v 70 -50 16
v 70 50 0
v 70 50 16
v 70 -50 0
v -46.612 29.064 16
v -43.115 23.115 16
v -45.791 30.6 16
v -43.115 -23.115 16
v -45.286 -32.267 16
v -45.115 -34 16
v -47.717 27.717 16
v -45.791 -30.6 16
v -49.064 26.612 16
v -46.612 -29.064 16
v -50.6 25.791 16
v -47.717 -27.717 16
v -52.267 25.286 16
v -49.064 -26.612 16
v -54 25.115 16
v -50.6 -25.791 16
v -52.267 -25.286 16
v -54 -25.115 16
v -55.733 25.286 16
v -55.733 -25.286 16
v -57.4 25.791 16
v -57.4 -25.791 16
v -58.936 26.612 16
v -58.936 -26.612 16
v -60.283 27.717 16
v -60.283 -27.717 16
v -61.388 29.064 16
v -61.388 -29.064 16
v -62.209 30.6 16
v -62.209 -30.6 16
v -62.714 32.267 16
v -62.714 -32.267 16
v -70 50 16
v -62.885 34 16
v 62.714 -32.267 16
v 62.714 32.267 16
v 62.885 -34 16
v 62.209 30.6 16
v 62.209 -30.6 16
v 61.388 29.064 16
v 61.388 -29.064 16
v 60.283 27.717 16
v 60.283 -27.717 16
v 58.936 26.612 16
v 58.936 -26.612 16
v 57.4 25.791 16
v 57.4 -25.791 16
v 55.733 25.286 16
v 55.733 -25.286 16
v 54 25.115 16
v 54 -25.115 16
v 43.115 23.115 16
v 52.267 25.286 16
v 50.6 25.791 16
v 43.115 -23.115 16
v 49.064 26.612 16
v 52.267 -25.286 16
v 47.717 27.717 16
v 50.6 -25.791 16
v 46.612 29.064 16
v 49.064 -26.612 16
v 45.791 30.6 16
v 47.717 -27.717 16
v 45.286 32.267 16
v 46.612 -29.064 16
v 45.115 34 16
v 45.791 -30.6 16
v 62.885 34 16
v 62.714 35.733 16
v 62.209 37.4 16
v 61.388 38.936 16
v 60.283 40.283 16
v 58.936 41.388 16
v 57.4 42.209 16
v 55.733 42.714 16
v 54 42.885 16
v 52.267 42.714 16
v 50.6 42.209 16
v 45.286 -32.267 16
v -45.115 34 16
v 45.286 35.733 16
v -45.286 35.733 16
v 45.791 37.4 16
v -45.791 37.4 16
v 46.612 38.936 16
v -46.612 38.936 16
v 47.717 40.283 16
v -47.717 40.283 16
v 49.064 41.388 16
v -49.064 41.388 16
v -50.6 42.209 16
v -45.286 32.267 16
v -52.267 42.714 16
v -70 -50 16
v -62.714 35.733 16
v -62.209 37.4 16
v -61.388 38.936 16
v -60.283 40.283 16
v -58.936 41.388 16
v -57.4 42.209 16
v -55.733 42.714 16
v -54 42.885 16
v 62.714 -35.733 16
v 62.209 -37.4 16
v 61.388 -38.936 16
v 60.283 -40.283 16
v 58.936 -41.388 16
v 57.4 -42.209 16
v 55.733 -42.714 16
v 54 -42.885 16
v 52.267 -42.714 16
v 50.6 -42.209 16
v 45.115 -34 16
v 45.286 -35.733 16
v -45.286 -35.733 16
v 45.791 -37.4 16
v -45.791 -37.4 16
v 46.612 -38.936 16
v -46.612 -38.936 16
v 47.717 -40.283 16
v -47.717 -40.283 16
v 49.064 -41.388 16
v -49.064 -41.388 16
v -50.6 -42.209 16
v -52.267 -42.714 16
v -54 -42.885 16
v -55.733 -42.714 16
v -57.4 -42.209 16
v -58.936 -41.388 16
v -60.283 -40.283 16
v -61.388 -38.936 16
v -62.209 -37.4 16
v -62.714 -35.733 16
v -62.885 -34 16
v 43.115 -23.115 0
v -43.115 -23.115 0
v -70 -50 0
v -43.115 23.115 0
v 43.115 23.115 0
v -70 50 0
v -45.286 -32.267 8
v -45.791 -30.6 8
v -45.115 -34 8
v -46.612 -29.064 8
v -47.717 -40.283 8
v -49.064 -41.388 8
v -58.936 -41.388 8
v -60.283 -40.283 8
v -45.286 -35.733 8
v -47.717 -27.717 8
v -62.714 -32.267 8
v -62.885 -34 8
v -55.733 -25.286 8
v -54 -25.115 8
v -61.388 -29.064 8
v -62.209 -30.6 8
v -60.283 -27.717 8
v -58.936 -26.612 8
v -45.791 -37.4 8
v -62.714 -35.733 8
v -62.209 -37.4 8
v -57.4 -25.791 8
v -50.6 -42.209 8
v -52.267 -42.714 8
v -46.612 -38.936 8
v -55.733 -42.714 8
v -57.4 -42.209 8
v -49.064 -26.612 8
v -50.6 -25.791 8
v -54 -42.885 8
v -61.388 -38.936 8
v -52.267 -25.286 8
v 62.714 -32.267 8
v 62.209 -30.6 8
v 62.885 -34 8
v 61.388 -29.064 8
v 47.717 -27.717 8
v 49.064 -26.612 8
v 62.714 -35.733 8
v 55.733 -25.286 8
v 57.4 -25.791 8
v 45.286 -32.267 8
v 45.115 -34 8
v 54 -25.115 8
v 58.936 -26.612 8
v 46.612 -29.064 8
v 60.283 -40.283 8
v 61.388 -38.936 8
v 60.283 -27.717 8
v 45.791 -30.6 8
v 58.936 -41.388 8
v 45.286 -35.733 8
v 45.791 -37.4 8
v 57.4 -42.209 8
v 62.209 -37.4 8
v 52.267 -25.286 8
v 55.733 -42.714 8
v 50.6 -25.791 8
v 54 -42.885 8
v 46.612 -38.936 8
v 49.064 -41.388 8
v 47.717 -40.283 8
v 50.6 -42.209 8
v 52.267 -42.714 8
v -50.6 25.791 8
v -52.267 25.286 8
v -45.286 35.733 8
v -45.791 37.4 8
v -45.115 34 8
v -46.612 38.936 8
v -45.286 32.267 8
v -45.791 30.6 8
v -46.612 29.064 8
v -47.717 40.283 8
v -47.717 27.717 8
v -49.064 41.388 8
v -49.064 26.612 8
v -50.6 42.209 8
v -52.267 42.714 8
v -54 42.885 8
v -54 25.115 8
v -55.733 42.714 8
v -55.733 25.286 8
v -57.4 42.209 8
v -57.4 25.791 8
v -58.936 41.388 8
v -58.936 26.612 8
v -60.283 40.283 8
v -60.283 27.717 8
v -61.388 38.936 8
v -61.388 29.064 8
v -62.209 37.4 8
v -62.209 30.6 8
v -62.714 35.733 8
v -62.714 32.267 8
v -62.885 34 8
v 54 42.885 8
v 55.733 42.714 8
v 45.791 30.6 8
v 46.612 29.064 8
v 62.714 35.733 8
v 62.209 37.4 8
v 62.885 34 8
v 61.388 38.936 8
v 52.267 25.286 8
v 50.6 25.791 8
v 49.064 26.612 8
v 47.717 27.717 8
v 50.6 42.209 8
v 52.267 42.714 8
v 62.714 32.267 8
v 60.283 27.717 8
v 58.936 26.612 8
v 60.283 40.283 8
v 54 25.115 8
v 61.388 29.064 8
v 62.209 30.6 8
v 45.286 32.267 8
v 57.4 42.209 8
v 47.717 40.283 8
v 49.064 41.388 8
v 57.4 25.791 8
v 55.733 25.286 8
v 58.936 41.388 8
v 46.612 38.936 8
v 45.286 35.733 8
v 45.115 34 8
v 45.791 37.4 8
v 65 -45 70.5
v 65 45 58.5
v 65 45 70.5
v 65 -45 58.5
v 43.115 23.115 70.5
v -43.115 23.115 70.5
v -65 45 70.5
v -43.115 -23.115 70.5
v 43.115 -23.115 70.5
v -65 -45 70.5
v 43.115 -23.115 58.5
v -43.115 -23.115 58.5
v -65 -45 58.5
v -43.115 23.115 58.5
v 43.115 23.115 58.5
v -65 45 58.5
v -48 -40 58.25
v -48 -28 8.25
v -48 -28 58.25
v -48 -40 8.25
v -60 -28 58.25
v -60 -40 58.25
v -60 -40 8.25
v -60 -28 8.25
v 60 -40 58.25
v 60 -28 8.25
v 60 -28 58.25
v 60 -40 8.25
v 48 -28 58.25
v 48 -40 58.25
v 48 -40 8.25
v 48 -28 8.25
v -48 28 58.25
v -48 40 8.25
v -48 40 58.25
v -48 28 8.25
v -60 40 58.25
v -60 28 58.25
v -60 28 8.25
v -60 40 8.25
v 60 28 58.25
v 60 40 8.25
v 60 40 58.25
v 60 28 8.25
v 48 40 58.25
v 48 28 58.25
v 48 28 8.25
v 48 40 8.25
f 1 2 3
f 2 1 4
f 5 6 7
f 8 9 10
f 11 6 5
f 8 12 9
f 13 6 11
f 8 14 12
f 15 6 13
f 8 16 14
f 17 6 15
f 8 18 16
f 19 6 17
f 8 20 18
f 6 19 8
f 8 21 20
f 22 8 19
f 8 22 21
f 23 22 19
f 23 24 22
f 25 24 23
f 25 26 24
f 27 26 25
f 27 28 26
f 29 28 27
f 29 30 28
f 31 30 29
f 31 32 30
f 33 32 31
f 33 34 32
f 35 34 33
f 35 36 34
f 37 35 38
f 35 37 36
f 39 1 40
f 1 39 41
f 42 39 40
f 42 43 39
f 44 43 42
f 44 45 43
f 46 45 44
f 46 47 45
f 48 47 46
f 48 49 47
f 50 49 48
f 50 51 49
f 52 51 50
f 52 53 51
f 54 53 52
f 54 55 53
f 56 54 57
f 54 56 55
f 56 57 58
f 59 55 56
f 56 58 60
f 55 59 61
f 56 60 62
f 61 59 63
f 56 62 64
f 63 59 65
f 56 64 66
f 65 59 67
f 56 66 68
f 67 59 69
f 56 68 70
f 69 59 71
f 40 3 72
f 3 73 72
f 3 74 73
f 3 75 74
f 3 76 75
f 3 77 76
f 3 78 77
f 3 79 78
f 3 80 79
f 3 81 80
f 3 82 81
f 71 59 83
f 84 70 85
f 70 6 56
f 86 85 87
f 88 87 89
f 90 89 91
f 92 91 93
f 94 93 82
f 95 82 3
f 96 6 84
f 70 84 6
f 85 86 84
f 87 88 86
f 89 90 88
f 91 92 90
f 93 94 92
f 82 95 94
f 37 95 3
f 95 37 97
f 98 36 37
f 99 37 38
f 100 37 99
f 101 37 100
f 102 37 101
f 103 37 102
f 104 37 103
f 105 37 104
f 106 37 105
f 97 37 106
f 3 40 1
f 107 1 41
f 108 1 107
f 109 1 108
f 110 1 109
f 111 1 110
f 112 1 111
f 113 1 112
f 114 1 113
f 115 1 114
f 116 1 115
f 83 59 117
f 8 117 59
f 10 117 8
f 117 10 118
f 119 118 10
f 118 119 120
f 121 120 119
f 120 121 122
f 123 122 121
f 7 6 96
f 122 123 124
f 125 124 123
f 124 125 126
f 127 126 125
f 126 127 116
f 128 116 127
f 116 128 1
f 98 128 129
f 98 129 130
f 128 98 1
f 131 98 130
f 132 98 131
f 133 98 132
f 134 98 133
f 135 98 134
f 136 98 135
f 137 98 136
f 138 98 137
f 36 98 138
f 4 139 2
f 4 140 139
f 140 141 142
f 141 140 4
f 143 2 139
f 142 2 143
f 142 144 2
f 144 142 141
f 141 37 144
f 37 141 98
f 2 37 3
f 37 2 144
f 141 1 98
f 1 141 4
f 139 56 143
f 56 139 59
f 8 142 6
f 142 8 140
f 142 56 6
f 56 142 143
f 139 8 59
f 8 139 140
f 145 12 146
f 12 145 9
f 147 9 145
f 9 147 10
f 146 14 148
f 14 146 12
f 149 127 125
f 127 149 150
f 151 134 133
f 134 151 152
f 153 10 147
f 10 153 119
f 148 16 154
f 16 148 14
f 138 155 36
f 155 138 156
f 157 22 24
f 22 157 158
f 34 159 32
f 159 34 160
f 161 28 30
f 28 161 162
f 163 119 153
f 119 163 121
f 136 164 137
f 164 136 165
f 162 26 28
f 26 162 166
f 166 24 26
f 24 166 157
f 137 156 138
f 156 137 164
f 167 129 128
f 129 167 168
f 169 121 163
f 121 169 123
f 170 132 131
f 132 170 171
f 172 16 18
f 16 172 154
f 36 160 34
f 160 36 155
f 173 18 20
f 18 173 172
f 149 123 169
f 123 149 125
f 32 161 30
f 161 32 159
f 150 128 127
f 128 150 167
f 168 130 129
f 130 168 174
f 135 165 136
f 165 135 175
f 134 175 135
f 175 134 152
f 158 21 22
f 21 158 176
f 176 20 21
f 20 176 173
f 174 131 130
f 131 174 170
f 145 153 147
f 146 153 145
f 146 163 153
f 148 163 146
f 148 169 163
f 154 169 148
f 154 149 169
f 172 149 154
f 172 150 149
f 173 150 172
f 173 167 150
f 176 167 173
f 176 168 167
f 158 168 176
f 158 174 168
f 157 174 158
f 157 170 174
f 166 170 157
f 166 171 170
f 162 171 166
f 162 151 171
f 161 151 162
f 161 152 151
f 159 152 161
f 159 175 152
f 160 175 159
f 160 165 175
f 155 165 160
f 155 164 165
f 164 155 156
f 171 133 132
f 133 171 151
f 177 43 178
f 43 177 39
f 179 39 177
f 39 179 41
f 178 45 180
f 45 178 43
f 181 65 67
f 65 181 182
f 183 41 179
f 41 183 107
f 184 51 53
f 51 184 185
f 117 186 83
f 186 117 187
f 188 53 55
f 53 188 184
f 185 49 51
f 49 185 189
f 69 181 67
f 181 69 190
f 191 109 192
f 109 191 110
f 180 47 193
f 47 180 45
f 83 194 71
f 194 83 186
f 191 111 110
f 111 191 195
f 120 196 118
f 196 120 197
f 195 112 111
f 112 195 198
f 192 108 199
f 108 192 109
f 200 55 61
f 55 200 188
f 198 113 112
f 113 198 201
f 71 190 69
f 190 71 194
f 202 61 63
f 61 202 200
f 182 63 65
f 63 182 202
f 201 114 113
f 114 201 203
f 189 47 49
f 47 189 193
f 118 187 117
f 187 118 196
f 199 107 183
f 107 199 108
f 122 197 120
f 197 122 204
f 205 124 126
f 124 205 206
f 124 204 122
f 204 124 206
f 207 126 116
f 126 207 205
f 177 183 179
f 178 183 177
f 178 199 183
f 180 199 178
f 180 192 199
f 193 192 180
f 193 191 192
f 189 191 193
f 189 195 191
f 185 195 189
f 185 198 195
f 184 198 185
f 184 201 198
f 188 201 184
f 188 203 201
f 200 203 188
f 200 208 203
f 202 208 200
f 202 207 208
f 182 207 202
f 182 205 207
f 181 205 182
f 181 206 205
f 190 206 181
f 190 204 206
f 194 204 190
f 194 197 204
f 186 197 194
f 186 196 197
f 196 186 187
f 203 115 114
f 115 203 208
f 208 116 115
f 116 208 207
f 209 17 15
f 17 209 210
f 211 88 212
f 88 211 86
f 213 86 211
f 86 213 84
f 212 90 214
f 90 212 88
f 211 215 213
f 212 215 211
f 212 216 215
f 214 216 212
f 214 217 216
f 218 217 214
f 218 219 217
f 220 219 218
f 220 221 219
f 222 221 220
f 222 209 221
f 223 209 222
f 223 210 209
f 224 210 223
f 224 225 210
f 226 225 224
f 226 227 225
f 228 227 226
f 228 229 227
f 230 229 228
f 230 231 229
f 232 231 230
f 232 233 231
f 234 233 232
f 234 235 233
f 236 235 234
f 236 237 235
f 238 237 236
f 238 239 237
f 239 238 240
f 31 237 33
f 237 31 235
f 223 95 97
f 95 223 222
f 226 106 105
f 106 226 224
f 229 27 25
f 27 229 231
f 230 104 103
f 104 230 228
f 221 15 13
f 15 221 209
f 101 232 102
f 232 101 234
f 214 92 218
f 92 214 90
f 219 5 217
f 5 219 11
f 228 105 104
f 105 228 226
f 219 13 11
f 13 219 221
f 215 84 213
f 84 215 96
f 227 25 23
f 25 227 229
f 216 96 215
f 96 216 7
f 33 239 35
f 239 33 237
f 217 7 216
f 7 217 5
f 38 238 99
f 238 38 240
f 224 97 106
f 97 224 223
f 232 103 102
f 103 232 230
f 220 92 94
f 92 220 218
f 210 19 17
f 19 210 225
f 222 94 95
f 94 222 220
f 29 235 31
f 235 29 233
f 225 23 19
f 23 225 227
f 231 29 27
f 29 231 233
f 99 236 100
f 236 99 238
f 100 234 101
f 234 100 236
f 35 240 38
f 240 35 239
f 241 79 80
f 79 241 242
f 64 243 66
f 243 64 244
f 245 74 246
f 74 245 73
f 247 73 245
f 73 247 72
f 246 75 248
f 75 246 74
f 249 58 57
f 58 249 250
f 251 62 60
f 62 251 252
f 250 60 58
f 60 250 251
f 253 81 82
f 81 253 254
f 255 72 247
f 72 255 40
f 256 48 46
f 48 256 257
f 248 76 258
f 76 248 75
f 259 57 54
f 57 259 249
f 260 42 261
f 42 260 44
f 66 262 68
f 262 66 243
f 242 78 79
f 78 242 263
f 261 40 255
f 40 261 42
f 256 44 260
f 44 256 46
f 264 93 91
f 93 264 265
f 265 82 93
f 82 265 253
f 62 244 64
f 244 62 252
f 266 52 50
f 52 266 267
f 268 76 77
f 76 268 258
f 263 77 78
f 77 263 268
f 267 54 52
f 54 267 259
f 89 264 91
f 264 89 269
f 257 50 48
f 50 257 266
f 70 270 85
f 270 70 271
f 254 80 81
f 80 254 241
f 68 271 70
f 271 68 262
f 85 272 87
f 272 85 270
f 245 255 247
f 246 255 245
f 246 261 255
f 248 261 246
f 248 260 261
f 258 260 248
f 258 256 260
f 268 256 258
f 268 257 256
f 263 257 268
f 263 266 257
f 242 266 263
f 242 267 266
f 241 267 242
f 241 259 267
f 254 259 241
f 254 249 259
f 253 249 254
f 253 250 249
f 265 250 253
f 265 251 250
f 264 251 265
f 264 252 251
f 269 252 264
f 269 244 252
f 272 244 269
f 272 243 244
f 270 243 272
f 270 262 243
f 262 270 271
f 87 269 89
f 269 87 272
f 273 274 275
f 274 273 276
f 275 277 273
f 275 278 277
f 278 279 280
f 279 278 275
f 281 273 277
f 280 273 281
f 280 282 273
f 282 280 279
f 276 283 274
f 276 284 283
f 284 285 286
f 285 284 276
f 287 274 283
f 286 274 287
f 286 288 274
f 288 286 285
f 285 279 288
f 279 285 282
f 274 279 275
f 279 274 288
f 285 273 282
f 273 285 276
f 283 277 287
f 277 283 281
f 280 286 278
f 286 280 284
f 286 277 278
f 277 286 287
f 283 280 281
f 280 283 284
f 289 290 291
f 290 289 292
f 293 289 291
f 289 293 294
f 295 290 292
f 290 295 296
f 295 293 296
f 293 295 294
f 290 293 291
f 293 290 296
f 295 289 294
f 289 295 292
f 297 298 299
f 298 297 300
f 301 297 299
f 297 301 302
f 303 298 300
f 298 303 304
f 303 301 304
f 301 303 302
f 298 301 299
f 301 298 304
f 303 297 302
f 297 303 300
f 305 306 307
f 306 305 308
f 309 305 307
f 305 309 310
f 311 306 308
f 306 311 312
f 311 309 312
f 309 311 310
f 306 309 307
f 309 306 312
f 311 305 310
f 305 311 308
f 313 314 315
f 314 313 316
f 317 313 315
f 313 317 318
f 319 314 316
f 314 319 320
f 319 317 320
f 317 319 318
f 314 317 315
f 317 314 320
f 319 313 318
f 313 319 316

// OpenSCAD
$fn = 32;

// ------------------------------------------------------------------------
// Frame cube: base 140 x 100 mm, posts 50 mm tall
// Every part is its own module, assembly() places every instance.
// ------------------------------------------------------------------------

// --- part 1 ---
module base_frame() {
  difference() {
    translate([-70, -50, 0]) cube([140, 100, 16]);
    translate([-43.115, -23.115, -1]) cube([86.23, 46.23, 18]);
    translate([-54, -34, 8]) cylinder(h = 9, d = 17.77);
    translate([54, -34, 8]) cylinder(h = 9, d = 17.77);
    translate([-54, 34, 8]) cylinder(h = 9, d = 17.77);
    translate([54, 34, 8]) cylinder(h = 9, d = 17.77);
  }
}

// --- part 2 ---
module corner_post() {
  translate([-6, -6, 0]) cube([12, 12, 50]);
}

// --- part 3 ---
module top_frame() {
  difference() {
    translate([-65, -45, 0]) cube([130, 90, 12]);
    translate([-43.115, -23.115, -1]) cube([86.23, 46.23, 14]);
  }
}

// --- assembly ---
module assembly() {
  color([0.80, 0.24, 0.20]) translate([0, 0, 0]) rotate([0, 0, 0]) base_frame();
  color([0.20, 0.45, 0.75]) translate([-54, -34, 8.25]) rotate([0, 0, 0]) corner_post();
  color([0.25, 0.62, 0.32]) translate([54, -34, 8.25]) rotate([0, 0, 0]) corner_post();
  color([0.92, 0.70, 0.18]) translate([-54, 34, 8.25]) rotate([0, 0, 0]) corner_post();
  color([0.58, 0.35, 0.70]) translate([54, 34, 8.25]) rotate([0, 0, 0]) corner_post();
  color([0.16, 0.66, 0.66]) translate([0, 0, 58.5]) rotate([0, 0, 0]) top_frame();
}

assembly();
